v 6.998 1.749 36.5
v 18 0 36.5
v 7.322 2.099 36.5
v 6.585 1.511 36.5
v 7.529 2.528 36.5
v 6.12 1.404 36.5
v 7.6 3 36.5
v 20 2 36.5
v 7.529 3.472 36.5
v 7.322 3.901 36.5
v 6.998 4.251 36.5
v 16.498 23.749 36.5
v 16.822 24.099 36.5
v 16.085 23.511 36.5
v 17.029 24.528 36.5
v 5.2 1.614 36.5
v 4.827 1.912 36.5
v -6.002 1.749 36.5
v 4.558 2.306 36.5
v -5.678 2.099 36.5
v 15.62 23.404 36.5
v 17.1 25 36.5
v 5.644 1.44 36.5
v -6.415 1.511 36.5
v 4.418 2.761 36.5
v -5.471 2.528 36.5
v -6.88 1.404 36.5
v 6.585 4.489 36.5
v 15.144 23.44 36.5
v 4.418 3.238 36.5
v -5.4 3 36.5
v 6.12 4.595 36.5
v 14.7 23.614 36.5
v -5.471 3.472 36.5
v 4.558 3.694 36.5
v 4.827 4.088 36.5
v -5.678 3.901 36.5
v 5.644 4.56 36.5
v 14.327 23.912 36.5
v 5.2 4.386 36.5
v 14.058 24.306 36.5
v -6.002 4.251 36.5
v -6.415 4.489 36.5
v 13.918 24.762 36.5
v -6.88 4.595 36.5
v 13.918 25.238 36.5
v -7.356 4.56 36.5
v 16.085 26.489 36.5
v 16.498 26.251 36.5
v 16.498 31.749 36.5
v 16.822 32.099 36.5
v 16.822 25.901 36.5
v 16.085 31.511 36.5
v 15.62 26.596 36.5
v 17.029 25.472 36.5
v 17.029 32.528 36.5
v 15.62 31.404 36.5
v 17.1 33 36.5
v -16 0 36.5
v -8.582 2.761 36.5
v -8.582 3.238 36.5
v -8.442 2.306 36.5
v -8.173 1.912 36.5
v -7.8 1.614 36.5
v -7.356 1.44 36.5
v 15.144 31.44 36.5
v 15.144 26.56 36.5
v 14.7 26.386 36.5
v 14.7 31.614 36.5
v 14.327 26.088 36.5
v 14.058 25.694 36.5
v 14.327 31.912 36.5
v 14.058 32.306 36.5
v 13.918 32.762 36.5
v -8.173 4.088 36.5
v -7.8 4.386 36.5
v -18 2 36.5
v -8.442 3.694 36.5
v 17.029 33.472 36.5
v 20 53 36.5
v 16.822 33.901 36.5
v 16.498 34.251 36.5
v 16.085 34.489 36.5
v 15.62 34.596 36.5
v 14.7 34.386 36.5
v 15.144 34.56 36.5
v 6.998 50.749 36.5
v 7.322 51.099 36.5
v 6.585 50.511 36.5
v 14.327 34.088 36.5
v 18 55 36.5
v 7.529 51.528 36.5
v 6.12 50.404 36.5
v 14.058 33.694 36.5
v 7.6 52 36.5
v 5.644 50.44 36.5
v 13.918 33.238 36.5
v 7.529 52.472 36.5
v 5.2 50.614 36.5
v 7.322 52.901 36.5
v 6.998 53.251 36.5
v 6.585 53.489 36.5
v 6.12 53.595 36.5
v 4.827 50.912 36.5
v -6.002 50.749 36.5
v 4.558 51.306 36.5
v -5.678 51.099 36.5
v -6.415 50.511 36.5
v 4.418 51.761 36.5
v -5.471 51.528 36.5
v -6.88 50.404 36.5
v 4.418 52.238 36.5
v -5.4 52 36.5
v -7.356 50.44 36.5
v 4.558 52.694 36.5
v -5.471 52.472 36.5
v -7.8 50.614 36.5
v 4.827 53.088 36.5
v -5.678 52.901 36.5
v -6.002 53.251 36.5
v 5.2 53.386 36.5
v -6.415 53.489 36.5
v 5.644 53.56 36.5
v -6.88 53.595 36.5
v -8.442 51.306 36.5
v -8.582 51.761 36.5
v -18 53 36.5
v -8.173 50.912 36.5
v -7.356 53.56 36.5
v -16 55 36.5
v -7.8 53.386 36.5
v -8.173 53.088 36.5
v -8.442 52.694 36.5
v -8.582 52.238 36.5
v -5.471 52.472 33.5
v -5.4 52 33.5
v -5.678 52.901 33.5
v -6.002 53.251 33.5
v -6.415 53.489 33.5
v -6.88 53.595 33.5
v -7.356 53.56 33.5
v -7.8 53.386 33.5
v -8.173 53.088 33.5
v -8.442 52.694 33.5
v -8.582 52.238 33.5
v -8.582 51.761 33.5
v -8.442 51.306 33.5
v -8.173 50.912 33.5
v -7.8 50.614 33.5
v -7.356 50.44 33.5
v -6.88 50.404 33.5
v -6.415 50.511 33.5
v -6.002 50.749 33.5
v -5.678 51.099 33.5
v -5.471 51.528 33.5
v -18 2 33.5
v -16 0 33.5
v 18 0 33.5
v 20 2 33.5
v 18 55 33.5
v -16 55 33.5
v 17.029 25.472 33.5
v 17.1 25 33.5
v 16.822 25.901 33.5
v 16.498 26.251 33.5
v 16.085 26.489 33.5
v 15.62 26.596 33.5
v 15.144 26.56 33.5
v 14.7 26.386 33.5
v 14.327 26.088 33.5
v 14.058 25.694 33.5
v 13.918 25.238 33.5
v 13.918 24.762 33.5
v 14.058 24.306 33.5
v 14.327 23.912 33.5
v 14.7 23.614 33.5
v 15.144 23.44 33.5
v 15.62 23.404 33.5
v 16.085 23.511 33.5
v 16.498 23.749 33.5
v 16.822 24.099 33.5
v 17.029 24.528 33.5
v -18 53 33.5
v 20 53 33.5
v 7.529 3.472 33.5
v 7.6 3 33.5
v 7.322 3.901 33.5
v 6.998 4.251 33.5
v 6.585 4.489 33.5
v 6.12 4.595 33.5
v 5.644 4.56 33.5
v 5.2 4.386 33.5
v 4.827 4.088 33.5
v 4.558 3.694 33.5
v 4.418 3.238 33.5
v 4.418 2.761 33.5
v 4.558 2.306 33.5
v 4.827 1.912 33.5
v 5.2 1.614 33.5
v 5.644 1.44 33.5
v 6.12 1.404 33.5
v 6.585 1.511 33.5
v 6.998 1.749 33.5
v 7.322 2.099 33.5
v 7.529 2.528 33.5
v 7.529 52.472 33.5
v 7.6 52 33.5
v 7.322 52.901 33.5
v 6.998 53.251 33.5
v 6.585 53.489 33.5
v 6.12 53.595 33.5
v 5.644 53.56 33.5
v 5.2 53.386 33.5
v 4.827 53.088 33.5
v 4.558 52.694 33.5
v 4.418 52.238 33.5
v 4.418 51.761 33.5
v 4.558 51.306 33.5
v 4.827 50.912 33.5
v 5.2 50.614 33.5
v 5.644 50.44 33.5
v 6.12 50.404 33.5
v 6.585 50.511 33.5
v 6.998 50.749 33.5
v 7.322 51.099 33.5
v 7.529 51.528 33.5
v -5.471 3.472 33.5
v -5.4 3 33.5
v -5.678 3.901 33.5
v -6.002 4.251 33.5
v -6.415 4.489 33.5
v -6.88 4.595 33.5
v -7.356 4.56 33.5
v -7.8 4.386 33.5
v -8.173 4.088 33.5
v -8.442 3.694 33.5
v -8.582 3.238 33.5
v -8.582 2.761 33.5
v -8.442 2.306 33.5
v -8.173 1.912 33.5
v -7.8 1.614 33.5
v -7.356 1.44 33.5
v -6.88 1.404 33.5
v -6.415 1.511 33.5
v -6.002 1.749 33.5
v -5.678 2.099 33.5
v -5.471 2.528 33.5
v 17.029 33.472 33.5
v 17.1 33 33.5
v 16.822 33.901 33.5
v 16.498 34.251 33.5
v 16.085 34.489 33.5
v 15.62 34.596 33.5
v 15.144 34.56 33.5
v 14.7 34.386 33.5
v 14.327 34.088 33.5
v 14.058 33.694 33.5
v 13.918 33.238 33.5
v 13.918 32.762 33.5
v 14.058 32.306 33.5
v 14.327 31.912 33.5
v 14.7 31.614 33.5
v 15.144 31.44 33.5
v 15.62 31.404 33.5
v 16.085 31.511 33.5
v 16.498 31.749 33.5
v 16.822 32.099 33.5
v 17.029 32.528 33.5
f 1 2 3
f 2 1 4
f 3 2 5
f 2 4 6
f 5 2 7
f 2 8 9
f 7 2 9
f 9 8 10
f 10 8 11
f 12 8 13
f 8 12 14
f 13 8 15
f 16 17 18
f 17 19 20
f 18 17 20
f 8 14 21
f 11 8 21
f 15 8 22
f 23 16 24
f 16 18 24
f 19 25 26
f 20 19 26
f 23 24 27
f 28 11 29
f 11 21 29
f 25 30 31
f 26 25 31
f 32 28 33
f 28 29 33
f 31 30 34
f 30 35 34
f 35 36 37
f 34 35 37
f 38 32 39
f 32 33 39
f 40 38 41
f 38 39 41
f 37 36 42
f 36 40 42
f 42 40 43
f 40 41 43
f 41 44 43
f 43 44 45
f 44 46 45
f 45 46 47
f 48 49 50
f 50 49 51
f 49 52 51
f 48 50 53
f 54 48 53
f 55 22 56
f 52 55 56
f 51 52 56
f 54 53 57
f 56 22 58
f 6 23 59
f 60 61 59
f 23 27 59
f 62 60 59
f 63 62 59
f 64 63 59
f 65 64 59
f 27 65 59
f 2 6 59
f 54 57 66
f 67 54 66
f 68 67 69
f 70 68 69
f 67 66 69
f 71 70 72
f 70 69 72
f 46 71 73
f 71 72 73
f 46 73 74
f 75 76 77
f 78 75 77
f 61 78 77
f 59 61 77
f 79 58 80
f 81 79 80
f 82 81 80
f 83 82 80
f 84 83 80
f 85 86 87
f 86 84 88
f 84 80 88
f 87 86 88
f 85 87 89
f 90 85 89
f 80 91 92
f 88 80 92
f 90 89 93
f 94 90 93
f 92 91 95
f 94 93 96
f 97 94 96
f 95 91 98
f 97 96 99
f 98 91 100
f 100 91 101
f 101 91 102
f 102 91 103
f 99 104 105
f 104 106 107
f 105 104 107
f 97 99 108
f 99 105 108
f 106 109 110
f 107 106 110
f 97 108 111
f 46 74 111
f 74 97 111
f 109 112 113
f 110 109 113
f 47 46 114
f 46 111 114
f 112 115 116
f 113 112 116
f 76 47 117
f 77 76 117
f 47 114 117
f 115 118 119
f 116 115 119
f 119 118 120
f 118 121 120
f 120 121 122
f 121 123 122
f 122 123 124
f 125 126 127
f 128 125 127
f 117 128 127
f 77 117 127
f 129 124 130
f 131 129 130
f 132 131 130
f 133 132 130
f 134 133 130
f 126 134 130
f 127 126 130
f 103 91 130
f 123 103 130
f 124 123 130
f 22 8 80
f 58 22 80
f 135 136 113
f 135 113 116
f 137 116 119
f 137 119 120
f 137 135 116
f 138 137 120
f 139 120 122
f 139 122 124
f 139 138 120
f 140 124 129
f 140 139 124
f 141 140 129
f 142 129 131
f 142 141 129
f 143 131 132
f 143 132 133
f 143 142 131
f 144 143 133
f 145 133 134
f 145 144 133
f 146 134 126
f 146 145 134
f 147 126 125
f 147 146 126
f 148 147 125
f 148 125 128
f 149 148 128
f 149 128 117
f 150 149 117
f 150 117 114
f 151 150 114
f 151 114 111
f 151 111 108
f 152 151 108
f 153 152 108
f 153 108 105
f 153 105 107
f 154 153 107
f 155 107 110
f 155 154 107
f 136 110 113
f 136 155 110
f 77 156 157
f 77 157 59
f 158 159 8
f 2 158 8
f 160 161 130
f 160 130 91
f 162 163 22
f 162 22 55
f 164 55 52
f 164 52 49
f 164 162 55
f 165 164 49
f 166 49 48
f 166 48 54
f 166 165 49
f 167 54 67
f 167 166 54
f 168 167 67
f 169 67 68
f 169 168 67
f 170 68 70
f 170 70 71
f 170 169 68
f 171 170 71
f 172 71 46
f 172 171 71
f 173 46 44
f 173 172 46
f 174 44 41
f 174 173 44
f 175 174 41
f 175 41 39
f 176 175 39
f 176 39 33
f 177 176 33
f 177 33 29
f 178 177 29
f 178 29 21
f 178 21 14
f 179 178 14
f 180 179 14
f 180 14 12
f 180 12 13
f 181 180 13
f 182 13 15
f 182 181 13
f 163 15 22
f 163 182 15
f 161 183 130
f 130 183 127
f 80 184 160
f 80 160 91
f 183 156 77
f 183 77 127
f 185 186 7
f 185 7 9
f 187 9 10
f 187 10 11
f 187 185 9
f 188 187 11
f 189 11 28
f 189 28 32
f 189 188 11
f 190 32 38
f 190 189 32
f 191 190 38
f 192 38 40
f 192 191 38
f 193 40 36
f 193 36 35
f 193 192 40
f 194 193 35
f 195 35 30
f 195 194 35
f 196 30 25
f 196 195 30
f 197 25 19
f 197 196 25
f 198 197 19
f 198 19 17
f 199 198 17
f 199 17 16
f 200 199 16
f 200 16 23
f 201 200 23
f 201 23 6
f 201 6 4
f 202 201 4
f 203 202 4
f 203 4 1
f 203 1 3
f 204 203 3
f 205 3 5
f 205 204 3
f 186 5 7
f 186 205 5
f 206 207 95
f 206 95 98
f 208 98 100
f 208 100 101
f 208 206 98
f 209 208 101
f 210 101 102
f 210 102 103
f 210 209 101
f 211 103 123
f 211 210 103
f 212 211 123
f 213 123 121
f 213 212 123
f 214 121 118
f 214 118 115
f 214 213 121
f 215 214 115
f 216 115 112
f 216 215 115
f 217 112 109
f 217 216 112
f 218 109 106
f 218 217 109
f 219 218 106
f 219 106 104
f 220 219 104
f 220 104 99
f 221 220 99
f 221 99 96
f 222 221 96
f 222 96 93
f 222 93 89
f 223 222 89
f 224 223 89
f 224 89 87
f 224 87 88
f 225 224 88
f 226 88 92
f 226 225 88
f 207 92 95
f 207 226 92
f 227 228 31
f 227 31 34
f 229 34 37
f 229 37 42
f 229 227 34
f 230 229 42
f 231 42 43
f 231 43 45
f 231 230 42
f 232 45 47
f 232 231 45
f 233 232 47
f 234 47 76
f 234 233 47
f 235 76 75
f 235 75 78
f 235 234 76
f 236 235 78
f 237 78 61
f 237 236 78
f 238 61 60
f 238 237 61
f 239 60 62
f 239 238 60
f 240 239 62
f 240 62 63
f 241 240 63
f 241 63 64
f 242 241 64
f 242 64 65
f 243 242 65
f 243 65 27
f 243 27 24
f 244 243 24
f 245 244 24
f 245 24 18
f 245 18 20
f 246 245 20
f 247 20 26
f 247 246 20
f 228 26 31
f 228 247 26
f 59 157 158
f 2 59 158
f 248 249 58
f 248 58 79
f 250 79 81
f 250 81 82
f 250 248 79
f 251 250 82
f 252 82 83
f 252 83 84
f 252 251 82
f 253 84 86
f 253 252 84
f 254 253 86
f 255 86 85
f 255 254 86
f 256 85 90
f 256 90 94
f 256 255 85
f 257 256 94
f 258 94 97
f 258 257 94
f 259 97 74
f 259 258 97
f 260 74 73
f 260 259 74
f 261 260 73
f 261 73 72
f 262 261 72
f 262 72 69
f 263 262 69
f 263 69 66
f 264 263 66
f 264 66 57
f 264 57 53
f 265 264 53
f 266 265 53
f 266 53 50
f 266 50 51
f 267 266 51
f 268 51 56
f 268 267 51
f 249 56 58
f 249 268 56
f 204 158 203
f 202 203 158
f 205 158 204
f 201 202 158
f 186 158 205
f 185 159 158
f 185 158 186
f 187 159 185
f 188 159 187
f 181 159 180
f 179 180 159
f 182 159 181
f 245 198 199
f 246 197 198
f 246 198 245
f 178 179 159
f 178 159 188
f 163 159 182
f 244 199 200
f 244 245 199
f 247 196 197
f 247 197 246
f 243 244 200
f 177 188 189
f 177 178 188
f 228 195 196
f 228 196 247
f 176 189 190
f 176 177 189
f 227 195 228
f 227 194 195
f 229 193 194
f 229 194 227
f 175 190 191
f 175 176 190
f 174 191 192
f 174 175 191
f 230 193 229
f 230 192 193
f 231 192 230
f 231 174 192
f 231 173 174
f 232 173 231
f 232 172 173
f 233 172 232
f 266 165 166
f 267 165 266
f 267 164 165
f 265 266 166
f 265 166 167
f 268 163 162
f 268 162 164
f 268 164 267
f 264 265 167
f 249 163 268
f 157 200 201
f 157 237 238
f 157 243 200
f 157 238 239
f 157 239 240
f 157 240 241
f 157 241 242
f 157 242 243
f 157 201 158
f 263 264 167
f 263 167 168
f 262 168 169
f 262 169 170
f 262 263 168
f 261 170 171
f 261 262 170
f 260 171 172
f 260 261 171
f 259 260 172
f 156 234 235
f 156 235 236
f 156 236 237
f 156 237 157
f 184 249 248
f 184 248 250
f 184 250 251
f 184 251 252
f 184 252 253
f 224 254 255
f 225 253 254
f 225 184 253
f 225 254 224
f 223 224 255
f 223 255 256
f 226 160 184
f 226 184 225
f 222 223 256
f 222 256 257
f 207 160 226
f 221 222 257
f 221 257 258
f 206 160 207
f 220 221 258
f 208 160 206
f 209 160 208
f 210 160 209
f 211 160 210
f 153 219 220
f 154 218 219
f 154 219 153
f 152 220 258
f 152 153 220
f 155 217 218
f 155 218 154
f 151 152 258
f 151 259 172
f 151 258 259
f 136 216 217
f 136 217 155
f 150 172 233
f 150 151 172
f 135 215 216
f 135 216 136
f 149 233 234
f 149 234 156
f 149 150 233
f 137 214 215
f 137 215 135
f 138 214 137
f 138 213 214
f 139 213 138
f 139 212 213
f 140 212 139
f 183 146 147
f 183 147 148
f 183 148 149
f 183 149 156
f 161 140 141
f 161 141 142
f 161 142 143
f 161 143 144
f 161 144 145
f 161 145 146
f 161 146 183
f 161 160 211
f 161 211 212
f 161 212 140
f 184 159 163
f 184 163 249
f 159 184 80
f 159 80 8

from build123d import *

# Parameters (mm, degrees)
SKETCH145_R     = 1.6
PAD079_DEPTH    = 3
CHAMFER051_SIZE = 2
FILLET047_R     = 2
SKETCH_W        = 38
SKETCH_H        = 10
POCKET_DEPTH    = 3.001
CHAMFER_SIZE    = 2


with BuildPart() as part:
    # Sketch145 → Pad079 (new body)
    with BuildSketch(Plane.XY):
        with BuildLine():
            Line((-18, 55), (20, 55))
            Line((20, 55), (20, -10))
            Line((20, -10), (10, -10))
            ThreePointArc((10, -10), (9.707107, -9.292893), (9, -9))
            Line((5, -9), (9, -9))
            ThreePointArc((5, -9), (4.292893, -9.292893), (4, -10))
            Line((4, -10), (-8, -10))
            ThreePointArc((-8, -10), (-8.292893, -9.292893), (-9, -9))
            Line((-13, -9), (-9, -9))
            ThreePointArc((-13, -9), (-13.707107, -9.292893), (-14, -10))
            Line((-14, -10), (-18, -10))
            Line((-18, -10), (-18, 55))
        make_face()
        with Locations((15.5, 25)):
            Circle(SKETCH145_R, mode=Mode.SUBTRACT)
        with Locations((15.5, 33)):
            Circle(SKETCH145_R, mode=Mode.SUBTRACT)
        with Locations((5.999998, 51.999985)):
            Circle(SKETCH145_R, mode=Mode.SUBTRACT)
        with Locations((-7.000002, 51.999985)):
            Circle(SKETCH145_R, mode=Mode.SUBTRACT)
        with Locations((-7.000002, 2.999985)):
            Circle(SKETCH145_R, mode=Mode.SUBTRACT)
        with Locations((5.999998, 2.999985)):
            Circle(SKETCH145_R, mode=Mode.SUBTRACT)
        with BuildLine():
            ThreePointArc((-13, -2), (-14, -3), (-13, -4))
            Line((-13, -4), (-9, -4))
            ThreePointArc((-9, -4), (-8, -3), (-9, -2))
            Line((-13, -2), (-9, -2))
        make_face(mode=Mode.SUBTRACT)
        with BuildLine():
            ThreePointArc((5, -2), (4, -3), (5, -4))
            Line((5, -4), (9, -4))
            ThreePointArc((9, -4), (10, -3), (9, -2))
            Line((5, -2), (9, -2))
        make_face(mode=Mode.SUBTRACT)
    extrude(amount=PAD079_DEPTH)

    # Chamfer051
    chamfer051_edges = [part.edges().sort_by_distance(p)[0] for p in [
        (-18, 55, 1.5),
        (20, 55, 1.5),
        (20, -10, 1.5),
        (-18, -10, 1.5),
    ]]
    chamfer(chamfer051_edges, length=CHAMFER051_SIZE)

    # Fillet047
    fillet047_edges = [part.edges().sort_by_distance(p)[0] for p in [
        (-14, -10, 1.5),
        (-8, -10, 1.5),
        (4, -10, 1.5),
        (10, -10, 1.5),
    ]]
    fillet(fillet047_edges, radius=FILLET047_R)

    # Sketch → Pocket (cut, through all)
    with BuildSketch(Plane.XY):
        with Locations((1, -5)):
            Rectangle(SKETCH_W, SKETCH_H)
    extrude(amount=POCKET_DEPTH, mode=Mode.SUBTRACT)

    # Chamfer
    chamfer_edges = [part.edges().sort_by_distance(p)[0] for p in [
        (-18, 0, 1.5),
        (20, 0, 1.5),
    ]]
    chamfer(chamfer_edges, length=CHAMFER_SIZE)


with BuildPart() as part_1:
    # Body067 placement: moved
    add(part.part.moved(Location((0, -2.3e-05, 33.499985))))


solid = part_1.part
